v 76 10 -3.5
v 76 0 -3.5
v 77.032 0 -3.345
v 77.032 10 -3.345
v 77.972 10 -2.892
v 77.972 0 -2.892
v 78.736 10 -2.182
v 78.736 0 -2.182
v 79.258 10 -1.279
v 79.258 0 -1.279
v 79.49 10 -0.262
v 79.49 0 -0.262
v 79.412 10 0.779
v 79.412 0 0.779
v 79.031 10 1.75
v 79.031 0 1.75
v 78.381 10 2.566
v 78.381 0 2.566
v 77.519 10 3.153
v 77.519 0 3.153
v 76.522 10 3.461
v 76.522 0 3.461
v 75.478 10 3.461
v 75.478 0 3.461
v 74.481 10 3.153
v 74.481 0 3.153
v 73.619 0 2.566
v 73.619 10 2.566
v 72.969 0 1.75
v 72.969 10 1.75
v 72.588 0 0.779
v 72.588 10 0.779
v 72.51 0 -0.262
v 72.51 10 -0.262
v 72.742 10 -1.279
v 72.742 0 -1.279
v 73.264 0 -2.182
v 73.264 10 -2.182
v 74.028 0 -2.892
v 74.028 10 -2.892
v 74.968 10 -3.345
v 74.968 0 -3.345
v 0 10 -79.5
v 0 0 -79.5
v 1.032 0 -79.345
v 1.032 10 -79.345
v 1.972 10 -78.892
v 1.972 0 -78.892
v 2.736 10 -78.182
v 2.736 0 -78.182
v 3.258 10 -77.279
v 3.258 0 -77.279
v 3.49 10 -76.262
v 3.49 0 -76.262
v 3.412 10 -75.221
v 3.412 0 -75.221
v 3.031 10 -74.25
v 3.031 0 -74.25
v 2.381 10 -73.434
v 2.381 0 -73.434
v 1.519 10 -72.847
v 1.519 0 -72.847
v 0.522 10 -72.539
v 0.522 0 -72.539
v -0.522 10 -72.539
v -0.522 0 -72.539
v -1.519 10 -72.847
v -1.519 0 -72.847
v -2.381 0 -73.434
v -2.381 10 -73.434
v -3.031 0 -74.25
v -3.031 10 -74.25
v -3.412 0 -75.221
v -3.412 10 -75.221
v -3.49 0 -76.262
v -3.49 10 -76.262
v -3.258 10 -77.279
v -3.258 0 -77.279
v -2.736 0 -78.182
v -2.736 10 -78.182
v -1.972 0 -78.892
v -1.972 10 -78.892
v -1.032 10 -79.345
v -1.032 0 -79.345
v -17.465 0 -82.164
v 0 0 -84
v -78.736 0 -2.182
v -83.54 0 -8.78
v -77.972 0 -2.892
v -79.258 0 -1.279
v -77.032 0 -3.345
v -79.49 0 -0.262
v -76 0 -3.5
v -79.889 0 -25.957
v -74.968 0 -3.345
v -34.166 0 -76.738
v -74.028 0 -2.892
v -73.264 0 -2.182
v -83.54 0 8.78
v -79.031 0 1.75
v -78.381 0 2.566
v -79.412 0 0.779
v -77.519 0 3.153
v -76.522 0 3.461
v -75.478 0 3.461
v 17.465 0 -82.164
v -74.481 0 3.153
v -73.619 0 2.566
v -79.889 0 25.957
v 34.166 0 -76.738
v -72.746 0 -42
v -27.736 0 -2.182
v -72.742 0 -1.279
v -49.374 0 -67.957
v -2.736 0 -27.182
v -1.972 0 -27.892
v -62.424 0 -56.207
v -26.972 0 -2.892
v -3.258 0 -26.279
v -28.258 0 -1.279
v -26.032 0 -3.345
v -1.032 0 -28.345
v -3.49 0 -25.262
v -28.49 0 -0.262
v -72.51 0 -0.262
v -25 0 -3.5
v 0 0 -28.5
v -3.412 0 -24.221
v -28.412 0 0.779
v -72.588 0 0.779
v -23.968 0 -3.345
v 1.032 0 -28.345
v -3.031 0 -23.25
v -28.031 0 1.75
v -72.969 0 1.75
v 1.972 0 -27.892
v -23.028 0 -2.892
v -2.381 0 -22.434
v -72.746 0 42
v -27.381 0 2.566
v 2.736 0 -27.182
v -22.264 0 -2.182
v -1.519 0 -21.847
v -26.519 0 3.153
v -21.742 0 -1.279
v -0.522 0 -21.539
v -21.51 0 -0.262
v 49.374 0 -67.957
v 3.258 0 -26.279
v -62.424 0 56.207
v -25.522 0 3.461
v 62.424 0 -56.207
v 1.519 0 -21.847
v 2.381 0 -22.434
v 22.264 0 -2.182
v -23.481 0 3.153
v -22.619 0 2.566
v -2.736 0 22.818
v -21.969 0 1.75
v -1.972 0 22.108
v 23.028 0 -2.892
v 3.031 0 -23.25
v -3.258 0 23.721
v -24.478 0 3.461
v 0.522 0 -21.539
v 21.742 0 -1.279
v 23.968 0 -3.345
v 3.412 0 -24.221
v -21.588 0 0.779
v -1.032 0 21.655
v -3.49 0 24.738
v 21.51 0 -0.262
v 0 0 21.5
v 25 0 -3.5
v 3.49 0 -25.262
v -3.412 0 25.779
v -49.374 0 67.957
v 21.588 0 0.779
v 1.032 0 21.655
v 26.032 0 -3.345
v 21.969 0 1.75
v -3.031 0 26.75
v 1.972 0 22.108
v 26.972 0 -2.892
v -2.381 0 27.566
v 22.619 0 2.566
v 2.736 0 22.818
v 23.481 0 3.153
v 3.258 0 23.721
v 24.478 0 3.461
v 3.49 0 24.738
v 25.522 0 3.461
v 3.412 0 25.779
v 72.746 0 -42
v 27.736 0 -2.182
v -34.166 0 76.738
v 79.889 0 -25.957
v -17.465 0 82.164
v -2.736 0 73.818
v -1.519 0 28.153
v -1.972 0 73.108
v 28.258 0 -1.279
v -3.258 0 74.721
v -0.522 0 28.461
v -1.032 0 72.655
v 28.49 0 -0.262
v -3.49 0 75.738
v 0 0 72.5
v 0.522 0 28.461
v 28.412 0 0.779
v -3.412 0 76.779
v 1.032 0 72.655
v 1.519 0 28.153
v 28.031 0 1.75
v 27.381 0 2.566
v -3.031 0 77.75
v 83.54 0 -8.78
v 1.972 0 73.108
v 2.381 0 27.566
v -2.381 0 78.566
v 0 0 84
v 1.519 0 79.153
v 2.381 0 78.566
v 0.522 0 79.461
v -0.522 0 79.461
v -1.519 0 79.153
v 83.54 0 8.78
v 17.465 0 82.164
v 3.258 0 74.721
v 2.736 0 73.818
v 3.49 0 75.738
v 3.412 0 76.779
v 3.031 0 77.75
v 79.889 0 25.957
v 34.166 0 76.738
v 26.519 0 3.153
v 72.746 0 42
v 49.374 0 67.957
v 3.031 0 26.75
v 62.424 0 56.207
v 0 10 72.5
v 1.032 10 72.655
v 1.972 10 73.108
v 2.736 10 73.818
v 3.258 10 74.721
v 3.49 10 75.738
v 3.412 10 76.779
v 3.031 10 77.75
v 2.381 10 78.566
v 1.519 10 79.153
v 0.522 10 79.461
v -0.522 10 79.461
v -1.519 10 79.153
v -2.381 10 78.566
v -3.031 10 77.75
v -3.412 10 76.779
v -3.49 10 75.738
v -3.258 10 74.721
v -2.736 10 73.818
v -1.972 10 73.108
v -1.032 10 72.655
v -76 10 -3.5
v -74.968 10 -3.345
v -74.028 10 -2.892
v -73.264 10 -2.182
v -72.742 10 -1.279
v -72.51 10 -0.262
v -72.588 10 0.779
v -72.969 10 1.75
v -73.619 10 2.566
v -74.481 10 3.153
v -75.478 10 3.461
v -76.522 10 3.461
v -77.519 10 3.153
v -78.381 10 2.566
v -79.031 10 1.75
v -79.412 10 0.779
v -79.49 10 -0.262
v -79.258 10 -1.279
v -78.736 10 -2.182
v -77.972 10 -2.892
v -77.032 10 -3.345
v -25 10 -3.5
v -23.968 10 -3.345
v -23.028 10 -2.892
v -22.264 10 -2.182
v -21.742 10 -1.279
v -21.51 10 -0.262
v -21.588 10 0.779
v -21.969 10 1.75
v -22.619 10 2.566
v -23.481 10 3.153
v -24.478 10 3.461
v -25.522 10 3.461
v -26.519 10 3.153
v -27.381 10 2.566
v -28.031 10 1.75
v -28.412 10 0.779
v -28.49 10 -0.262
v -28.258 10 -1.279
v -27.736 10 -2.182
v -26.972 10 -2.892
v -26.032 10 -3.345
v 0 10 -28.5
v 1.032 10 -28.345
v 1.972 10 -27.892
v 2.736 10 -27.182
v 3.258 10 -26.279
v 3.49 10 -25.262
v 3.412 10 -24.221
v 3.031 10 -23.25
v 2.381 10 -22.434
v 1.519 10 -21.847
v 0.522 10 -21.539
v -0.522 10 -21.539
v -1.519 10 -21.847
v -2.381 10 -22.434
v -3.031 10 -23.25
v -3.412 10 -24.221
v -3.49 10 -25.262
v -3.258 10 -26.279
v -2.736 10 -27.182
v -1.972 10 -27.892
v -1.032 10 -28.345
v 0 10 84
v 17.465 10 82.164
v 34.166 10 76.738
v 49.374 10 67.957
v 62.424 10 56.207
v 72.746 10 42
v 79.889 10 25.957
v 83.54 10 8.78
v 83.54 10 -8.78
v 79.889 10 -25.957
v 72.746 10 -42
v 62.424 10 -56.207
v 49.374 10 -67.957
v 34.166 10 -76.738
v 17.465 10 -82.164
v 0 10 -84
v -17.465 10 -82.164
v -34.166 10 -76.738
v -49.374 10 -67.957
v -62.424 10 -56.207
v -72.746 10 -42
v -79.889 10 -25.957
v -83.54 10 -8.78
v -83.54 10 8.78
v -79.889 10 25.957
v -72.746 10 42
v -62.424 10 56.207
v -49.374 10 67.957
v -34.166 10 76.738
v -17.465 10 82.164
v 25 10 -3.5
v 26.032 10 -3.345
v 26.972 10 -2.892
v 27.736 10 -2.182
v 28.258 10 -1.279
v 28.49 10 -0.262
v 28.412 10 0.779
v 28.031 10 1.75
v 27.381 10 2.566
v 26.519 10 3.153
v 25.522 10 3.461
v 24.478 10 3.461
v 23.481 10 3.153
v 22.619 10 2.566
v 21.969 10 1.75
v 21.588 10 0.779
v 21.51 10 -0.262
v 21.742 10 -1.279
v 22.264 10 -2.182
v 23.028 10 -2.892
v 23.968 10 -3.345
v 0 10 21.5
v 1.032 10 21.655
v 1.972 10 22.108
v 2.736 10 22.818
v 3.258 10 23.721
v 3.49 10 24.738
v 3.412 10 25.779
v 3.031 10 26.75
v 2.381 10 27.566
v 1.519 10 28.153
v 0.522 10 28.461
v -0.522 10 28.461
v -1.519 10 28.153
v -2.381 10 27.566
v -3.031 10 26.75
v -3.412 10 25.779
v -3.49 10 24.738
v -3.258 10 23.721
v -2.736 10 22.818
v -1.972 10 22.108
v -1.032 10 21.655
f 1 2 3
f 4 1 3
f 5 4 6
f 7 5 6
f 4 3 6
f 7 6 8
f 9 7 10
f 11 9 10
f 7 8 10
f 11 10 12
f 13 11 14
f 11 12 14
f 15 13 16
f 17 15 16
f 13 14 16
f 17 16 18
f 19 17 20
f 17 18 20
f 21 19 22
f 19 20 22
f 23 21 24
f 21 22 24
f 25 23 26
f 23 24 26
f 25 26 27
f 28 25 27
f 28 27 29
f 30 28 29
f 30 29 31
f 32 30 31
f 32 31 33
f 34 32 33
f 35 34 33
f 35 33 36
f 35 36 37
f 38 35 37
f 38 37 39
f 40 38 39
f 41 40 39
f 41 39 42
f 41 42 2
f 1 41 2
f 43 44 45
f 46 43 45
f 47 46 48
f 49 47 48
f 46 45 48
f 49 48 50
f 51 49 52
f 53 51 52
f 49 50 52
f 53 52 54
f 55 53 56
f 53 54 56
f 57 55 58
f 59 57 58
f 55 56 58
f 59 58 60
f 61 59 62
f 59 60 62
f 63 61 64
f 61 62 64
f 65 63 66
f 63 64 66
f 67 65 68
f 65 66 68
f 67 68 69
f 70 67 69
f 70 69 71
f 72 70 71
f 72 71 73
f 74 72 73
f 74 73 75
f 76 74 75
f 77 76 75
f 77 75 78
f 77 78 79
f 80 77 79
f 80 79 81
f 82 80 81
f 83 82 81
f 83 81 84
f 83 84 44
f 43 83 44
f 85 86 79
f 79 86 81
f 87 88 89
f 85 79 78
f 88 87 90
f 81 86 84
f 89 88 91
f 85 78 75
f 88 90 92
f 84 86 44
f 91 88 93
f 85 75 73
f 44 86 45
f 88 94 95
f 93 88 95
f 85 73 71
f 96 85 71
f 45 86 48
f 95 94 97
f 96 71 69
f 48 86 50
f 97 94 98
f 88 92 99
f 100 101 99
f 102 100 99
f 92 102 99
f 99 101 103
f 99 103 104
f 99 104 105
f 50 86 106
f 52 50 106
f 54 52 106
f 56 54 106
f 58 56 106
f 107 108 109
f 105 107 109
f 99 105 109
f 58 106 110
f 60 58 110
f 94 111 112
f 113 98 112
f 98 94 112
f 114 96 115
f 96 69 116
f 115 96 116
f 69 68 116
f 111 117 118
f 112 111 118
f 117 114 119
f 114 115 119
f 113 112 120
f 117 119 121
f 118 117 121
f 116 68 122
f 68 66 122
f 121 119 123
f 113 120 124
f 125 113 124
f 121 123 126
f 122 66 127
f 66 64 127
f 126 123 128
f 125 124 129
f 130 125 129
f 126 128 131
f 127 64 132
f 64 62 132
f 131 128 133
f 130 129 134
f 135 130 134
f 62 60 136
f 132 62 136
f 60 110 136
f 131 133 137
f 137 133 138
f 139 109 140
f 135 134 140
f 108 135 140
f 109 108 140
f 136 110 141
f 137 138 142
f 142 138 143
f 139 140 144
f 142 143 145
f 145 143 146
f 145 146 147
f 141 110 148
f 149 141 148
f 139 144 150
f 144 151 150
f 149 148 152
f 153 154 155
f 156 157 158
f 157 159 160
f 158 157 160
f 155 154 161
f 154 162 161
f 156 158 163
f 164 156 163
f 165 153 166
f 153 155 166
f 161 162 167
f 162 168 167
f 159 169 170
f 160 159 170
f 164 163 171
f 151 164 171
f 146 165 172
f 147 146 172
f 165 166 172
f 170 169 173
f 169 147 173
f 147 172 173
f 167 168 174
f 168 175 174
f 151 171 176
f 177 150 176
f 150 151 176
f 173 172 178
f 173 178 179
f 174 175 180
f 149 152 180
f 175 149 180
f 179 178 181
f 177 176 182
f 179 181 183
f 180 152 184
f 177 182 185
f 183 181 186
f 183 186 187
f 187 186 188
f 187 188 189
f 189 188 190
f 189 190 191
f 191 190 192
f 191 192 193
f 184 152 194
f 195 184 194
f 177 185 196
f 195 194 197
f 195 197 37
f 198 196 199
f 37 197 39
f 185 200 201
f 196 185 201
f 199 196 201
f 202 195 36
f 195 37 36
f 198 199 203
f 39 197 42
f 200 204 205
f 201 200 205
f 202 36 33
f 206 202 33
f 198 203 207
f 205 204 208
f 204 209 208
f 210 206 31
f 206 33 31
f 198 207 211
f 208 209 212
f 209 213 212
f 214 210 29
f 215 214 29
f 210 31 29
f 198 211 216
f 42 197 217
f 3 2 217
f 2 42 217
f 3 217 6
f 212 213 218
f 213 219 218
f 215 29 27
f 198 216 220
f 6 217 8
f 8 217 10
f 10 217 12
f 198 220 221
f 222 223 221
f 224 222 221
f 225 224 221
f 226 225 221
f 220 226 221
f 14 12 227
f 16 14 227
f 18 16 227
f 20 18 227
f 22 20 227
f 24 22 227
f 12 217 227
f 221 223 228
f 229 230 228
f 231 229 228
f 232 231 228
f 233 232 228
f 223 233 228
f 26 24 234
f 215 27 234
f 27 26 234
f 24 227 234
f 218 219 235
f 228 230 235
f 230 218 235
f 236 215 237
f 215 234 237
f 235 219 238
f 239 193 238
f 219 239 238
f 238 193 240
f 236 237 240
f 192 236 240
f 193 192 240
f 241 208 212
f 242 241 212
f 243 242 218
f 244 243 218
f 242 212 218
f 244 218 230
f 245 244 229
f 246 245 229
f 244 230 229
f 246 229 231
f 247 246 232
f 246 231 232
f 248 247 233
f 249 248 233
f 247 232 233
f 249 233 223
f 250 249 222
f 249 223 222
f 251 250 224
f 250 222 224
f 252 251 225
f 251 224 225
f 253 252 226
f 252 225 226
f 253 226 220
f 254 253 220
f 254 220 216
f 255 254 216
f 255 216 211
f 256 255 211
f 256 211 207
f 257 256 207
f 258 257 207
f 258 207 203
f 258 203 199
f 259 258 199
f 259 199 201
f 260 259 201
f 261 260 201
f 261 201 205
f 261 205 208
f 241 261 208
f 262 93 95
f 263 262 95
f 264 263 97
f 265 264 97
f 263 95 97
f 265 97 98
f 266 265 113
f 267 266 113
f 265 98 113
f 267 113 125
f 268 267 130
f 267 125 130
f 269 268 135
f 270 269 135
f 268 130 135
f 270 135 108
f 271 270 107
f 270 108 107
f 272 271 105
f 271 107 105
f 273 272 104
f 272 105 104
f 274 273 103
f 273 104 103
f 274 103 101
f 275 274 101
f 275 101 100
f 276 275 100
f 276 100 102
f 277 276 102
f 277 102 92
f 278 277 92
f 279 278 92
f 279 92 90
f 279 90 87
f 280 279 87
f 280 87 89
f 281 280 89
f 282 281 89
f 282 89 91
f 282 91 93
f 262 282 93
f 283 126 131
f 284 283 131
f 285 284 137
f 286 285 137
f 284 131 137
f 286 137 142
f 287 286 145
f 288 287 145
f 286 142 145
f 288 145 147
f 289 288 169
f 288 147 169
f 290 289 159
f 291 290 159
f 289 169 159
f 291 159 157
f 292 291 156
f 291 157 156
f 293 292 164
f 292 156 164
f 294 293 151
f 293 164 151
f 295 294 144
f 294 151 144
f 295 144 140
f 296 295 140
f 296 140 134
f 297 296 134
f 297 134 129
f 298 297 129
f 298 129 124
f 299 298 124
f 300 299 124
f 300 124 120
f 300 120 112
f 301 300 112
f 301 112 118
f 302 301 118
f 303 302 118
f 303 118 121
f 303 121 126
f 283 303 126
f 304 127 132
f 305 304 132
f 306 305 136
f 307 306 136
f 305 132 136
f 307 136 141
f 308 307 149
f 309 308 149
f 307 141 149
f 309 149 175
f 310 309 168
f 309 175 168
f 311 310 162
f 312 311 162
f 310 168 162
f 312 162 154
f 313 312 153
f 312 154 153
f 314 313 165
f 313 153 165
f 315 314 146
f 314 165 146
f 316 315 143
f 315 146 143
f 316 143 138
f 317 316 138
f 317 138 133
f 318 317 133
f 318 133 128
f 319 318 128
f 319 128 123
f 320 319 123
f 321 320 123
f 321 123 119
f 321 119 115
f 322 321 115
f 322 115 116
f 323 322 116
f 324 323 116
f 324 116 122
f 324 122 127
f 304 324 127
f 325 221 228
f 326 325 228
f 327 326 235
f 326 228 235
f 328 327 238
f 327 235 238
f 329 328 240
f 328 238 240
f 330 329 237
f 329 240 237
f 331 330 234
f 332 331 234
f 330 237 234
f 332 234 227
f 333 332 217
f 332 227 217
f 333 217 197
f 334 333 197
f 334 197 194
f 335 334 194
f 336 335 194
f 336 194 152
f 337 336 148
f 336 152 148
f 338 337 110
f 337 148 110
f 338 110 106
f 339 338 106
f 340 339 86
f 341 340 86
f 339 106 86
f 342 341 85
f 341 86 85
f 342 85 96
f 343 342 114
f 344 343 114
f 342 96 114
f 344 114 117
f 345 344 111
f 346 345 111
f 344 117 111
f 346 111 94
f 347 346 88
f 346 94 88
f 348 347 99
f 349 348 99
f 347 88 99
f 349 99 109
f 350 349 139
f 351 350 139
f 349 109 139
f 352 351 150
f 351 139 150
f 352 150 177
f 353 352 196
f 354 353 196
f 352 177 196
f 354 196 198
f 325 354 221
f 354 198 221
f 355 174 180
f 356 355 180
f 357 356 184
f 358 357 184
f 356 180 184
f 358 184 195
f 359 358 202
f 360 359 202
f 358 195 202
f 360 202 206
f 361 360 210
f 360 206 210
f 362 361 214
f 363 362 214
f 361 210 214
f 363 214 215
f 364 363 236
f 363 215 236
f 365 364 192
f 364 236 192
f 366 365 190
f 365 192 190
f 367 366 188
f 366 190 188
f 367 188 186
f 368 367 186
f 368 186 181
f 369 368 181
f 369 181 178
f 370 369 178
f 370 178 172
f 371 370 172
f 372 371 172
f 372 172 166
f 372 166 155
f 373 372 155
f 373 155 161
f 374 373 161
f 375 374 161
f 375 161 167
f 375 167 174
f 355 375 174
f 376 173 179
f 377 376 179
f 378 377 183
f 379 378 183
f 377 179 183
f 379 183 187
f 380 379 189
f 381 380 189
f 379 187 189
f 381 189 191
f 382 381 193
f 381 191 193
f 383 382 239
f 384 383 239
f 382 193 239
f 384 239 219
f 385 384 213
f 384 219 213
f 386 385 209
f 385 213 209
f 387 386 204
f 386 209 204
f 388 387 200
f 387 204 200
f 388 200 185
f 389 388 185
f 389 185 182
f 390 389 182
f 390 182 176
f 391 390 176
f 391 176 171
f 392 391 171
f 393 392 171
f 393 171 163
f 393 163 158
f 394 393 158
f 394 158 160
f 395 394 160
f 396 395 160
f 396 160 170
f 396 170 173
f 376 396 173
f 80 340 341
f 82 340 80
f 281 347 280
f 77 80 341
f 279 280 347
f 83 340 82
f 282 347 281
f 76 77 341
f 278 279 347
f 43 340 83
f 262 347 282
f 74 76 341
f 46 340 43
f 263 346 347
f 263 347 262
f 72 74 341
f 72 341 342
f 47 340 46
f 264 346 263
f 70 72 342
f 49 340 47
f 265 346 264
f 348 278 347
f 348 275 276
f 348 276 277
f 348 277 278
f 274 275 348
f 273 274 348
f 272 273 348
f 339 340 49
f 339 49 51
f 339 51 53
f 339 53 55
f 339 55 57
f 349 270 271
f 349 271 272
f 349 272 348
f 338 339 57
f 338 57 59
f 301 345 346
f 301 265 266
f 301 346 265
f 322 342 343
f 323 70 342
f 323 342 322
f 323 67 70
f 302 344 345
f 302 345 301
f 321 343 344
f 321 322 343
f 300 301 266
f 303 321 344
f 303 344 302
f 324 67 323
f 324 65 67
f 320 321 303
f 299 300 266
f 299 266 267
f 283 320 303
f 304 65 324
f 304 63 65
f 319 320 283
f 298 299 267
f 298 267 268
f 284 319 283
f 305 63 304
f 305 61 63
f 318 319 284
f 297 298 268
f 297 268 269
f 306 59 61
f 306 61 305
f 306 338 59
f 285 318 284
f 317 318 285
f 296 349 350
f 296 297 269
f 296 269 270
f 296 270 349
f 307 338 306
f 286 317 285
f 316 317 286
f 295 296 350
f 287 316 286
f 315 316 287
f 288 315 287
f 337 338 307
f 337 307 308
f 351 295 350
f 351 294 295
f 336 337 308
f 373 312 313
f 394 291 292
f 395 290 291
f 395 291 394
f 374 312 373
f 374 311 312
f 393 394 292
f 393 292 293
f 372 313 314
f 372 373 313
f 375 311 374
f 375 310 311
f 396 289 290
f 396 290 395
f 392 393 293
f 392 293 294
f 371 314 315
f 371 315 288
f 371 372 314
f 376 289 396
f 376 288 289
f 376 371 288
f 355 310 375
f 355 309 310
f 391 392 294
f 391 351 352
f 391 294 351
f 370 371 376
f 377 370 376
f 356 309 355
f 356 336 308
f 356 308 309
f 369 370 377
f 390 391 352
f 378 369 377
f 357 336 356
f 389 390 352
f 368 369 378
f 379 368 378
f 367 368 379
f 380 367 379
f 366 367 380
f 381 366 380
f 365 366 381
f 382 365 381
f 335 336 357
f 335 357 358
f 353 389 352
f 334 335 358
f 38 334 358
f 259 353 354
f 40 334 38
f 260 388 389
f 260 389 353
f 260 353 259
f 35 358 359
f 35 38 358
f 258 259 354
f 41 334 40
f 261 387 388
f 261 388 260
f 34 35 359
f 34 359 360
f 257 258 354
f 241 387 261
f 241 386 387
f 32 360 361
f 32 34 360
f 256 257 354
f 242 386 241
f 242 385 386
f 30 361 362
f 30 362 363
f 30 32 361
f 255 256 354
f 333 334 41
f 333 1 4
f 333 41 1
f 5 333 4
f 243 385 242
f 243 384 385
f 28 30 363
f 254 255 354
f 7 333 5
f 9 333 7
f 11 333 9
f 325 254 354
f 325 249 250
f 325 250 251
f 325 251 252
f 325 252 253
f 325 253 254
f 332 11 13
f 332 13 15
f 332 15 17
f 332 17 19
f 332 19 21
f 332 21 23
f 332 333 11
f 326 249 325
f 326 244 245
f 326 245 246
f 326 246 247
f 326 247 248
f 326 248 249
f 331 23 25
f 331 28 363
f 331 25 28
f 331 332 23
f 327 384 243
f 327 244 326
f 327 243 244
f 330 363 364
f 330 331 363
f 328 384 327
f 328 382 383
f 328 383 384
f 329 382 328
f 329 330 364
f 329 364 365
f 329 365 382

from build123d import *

# Parameters (mm, degrees)
SKETCH1_R            = 84
BOSS_EXTRUDE1_DEPTH  = 10
M6_CLEARANCE_HOLE1_D = 7


with BuildPart() as part:
    # Sketch1 → Boss-Extrude1 (new body)
    with BuildSketch(Plane(origin=(0, 0, 0), x_dir=(1, 0, 0), z_dir=(0, 1, 0))):
        with Locations(Location((0, 0, 0), (0, 0, 270))):
            Circle(SKETCH1_R)
    extrude(amount=BOSS_EXTRUDE1_DEPTH)

    # M6 Clearance Hole1 (through all)
    with Locations(Plane(origin=(0, 10, -76), x_dir=(0, 0, 1), z_dir=(0, 1, 0))):
        with Locations((0, 0), (76, -76), (76, 76), (76, 25), (51, 0), (76, -25), (101, 0), (152, 0)):
            Hole(M6_CLEARANCE_HOLE1_D / 2)


solid = part.part
